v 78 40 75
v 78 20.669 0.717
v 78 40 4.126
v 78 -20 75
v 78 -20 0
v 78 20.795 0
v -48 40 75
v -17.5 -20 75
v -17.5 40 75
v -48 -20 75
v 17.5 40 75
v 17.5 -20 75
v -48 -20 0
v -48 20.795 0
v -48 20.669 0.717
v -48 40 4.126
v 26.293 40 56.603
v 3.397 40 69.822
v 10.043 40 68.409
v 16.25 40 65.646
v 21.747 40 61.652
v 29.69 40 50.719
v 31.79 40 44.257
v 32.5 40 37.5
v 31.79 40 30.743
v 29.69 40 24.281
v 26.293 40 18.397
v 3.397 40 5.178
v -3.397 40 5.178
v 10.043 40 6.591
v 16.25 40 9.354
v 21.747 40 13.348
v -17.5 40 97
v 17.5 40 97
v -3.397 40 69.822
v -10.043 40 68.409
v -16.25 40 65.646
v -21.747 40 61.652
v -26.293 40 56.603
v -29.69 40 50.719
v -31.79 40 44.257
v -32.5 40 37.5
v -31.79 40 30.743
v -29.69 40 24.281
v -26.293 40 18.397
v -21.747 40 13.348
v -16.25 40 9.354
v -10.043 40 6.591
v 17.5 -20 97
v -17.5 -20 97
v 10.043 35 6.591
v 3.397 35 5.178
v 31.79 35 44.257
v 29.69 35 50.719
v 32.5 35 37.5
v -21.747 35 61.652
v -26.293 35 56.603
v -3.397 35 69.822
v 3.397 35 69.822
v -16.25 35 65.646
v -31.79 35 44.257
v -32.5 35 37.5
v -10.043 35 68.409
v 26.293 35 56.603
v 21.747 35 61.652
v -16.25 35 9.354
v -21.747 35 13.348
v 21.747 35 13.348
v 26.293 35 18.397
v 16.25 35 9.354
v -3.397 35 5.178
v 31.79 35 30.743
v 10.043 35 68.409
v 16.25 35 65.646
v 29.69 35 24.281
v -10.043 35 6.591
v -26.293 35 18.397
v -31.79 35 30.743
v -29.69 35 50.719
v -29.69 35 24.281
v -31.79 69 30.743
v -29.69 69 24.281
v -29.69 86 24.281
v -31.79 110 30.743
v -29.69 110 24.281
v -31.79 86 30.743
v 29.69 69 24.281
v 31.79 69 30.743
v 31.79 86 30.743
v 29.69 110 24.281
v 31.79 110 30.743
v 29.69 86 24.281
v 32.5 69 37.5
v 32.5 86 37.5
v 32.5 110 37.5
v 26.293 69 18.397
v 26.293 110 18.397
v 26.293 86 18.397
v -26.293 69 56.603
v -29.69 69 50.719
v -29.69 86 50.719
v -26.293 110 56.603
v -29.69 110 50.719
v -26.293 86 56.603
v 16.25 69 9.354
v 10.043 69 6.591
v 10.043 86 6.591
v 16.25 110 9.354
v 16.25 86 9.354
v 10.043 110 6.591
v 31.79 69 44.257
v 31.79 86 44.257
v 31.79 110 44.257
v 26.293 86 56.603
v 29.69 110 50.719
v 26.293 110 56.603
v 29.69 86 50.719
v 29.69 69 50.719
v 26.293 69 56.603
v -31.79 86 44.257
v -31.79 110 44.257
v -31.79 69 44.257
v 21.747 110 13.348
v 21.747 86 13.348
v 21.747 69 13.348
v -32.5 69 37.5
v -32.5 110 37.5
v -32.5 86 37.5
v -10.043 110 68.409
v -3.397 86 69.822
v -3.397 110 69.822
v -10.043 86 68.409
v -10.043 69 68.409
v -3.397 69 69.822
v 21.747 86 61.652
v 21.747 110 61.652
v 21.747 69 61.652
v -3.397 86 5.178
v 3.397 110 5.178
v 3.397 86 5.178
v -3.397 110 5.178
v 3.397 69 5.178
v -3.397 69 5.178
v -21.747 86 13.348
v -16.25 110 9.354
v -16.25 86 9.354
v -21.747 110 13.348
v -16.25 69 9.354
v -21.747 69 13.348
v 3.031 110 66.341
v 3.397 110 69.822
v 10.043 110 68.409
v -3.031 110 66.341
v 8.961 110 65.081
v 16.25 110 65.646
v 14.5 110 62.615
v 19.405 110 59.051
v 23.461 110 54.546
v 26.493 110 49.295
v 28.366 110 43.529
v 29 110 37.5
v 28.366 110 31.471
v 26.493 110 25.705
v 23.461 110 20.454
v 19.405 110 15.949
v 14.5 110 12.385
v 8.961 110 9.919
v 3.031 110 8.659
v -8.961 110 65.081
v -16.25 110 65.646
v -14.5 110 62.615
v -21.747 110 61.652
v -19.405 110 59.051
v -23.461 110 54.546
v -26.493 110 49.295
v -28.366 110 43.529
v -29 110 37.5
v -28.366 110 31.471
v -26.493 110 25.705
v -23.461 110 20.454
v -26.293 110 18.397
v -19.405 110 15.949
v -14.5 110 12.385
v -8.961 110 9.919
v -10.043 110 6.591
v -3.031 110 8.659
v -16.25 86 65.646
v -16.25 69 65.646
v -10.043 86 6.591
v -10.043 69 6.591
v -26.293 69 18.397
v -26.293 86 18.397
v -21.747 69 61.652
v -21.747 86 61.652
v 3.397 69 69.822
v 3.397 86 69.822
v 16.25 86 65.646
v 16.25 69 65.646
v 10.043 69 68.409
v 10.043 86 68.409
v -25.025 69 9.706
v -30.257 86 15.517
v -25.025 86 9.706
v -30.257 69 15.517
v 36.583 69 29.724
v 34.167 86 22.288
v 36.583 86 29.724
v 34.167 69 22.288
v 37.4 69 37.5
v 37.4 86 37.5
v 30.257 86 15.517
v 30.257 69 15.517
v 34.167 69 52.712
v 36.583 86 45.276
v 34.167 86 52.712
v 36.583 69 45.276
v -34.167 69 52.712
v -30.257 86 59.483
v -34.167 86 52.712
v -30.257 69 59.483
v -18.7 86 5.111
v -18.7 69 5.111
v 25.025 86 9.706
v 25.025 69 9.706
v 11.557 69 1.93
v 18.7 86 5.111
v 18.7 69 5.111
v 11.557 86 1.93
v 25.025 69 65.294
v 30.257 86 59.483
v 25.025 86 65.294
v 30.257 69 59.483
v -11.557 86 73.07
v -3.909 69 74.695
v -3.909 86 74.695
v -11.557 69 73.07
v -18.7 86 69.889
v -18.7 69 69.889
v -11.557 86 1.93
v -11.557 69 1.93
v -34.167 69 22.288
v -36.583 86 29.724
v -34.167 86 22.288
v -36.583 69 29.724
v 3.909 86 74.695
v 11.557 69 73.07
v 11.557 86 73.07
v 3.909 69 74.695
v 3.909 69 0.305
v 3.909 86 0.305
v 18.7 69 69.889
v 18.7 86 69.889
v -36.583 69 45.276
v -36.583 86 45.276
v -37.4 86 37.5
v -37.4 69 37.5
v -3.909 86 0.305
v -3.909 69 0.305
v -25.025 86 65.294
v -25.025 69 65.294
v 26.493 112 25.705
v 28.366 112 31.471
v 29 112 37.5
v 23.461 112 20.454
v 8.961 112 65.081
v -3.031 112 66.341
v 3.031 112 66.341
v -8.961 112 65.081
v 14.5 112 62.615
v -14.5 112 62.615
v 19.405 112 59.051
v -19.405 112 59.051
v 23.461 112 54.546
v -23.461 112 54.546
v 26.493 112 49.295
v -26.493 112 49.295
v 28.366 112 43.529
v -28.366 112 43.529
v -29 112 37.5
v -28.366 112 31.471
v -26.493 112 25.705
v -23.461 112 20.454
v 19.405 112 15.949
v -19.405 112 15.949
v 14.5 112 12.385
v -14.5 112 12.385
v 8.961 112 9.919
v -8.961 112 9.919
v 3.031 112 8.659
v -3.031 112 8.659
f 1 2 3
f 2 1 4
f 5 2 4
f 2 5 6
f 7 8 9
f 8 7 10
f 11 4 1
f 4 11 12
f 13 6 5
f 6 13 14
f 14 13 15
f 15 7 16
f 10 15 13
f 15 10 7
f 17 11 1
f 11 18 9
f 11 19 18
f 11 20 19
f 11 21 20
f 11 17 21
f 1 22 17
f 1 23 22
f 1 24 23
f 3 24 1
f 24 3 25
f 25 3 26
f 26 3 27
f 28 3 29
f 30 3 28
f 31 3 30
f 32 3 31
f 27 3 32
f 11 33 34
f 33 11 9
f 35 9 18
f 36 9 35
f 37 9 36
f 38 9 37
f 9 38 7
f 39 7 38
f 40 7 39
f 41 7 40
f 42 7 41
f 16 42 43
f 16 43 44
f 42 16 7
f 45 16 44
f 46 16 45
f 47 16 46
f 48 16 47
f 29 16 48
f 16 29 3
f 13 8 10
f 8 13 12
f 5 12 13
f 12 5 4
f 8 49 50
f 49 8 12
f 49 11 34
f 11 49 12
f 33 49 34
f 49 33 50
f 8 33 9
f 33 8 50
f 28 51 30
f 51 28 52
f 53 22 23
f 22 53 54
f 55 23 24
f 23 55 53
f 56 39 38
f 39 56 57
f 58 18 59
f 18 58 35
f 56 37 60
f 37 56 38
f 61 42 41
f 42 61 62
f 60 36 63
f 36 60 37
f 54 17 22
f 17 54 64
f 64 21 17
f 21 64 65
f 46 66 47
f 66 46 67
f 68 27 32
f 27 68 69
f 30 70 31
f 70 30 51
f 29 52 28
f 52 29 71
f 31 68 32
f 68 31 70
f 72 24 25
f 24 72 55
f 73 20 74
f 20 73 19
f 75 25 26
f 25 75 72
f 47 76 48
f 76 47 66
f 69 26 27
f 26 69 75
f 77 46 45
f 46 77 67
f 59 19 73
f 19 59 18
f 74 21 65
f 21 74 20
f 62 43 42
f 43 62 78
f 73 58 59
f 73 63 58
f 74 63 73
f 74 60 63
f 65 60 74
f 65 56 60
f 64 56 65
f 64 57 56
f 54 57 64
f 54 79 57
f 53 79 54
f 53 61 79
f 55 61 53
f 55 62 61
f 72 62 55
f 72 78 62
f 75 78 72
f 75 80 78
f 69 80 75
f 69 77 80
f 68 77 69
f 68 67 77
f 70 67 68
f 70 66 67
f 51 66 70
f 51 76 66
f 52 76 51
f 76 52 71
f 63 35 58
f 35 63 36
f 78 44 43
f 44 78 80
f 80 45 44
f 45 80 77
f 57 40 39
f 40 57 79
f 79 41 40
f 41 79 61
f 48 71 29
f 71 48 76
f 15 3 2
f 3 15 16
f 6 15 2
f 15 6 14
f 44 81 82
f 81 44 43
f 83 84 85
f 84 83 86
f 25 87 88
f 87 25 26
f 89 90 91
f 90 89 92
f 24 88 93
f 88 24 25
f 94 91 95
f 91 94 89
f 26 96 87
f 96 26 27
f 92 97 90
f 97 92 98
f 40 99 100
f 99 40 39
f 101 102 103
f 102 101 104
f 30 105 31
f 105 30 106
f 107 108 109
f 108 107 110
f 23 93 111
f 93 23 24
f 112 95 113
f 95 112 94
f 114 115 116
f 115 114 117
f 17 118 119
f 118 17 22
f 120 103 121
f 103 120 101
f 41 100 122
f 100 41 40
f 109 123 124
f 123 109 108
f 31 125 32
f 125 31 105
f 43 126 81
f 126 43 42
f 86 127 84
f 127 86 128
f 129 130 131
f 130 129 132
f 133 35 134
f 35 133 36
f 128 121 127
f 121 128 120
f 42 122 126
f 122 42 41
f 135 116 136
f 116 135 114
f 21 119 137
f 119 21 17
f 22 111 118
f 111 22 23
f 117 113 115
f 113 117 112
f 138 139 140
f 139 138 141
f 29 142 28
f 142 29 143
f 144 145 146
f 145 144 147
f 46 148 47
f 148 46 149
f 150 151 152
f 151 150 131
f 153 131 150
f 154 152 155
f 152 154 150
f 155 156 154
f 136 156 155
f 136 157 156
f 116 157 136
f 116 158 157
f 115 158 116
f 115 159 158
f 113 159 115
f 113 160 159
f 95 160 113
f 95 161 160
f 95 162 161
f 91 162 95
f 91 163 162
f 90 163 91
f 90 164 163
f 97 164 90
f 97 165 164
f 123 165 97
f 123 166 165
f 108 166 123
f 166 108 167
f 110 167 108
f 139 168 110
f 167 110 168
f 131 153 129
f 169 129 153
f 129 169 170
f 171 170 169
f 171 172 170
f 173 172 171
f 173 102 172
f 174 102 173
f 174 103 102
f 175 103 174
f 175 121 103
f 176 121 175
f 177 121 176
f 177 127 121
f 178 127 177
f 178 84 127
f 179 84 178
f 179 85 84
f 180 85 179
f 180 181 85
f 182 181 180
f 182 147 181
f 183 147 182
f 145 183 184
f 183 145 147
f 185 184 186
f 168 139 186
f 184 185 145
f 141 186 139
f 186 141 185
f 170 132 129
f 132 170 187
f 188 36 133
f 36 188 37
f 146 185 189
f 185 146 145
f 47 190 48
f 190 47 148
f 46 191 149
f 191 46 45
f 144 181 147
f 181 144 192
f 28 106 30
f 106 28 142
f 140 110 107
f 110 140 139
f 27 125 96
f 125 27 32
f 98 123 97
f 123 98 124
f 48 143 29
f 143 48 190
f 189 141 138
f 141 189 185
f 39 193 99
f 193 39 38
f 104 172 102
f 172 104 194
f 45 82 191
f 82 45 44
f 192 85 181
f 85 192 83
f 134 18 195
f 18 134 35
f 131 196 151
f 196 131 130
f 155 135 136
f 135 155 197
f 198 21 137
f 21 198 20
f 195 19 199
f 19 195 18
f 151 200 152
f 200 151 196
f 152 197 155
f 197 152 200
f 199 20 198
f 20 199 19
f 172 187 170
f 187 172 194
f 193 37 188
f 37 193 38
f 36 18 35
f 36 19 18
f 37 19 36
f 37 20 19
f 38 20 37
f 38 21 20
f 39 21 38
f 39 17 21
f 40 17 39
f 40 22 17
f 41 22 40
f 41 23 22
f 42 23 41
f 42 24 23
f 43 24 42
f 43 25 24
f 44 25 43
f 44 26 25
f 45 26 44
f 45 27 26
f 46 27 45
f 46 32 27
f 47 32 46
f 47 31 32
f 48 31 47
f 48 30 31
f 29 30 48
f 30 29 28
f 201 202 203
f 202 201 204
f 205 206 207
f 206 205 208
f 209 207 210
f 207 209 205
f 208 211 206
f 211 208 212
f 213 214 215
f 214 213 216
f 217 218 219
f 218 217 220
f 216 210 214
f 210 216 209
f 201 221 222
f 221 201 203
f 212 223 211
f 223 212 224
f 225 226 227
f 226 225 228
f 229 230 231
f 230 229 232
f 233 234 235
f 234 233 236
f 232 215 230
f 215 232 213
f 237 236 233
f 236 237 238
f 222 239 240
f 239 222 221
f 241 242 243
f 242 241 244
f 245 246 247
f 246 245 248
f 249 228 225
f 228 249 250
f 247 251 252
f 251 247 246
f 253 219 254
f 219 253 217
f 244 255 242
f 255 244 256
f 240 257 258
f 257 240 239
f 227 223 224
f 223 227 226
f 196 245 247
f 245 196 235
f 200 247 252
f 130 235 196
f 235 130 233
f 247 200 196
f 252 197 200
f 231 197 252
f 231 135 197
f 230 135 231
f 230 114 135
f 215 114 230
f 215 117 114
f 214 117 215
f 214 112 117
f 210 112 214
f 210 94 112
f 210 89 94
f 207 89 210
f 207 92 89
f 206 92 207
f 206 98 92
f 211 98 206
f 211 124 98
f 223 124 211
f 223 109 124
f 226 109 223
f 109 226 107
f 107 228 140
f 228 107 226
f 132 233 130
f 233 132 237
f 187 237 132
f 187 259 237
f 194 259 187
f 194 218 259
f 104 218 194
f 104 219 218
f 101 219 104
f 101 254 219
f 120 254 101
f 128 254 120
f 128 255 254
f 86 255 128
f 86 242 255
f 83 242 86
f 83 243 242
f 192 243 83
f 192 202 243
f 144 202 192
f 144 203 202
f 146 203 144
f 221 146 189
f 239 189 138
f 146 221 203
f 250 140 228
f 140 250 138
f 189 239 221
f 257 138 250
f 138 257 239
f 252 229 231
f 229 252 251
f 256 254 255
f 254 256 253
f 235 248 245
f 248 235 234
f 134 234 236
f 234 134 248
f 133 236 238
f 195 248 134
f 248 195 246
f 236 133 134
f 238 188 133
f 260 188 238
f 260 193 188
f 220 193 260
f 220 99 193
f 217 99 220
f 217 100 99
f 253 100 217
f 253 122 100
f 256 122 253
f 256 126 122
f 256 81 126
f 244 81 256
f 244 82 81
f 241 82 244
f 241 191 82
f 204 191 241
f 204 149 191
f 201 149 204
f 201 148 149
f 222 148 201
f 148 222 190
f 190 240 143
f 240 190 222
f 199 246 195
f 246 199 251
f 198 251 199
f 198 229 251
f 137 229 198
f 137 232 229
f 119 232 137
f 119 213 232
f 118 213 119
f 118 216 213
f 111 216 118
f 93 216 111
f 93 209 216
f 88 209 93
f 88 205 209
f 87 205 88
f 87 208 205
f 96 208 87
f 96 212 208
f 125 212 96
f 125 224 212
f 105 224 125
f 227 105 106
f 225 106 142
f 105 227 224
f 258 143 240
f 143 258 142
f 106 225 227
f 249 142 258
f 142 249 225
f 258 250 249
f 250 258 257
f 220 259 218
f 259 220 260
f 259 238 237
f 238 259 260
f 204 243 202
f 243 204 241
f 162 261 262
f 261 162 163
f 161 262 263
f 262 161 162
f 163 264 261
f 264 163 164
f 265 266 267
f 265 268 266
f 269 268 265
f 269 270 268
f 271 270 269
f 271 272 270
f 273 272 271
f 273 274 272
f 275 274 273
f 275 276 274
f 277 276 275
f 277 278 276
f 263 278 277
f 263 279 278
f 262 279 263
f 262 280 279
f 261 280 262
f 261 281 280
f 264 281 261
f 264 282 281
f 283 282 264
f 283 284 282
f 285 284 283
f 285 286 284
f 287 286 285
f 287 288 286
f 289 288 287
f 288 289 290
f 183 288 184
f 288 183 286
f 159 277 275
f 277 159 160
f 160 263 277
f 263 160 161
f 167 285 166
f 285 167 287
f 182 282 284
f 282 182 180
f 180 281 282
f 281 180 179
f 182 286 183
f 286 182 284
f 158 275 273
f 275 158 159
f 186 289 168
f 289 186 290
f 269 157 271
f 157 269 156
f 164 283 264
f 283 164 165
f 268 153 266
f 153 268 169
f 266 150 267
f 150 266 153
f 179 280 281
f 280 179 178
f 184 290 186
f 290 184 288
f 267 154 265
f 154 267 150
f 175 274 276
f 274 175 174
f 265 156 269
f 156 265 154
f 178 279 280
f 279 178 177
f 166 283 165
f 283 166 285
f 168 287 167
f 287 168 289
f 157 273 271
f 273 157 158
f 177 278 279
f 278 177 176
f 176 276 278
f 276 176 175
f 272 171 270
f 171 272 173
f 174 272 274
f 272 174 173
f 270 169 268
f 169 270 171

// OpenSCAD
canonT2i();

module canonT2i () {
	width = 126;
	height = 75; // sans viewfinder
	depth = 60;
	bottom_depth = 40;
	viewfinder_width = 35;
	viewfinder_height = 22;
	viewfinder_x_offset = -15;

	lens_mount_diameter = 65;
	lens_mount_radius = lens_mount_diameter / 2;
	
	// Center the object so that it pivots on the screw hole
	translate([-viewfinder_x_offset, 10, 0]) {

		difference () {
			union () {
				// Base body
				translate([0, 0, height / 2])
					cube([ width, depth, height ], center = true);
				// Viewfinder
				translate([viewfinder_x_offset, 0, height + viewfinder_height / 2])
					cube([ viewfinder_width, depth, viewfinder_height ], center = true);
			}
			
			// Lens mount
			translate([viewfinder_x_offset, depth / 2, lens_mount_radius + 5])
				rotate(90, [1, 0, 0])
				cylinder(r = lens_mount_radius, h = 10, center = true); 
	
			// Bevel the front underside up to the lens mount
			translate([ 0, depth / 2 - 20 / 2 + 1, 0 ])
				rotate(10, [1, 0, 0])
				cube([ width + 0.1, 20 + 0.1, 5 ], center = true);
		}
	
		translate([viewfinder_x_offset, depth / 2, 5 + lens_mount_radius])
			rotate(-90, [1, 0, 0])
			canon85_18();
	}
}

module canon28_18 () {
	canonLens(focus_diameter = 72, focus_offset = 27, focus_width = 11, length = 56, lens_diameter = 58);
}

module canon85_18 () {
	canonLens(focus_diameter = 74.8, focus_offset = 29, focus_width = 17, length = 70, lens_diameter = 58);
}

module canonLens () {
	// Draw canon lens, assuming we're centered at lens mount point
	lens_mount_diameter = 65;
	union () {
		translate([0, 0, length / 2])
			cylinder(r = lens_mount_diameter / 2, h = length, center = true);
		translate([0, 0, focus_offset + focus_width / 2])
			cylinder(r = focus_diameter / 2, h = focus_width, center = true);
		translate([0, 0, length])
			cylinder(r = lens_diameter / 2, h = 4, center = true);
	}
}
